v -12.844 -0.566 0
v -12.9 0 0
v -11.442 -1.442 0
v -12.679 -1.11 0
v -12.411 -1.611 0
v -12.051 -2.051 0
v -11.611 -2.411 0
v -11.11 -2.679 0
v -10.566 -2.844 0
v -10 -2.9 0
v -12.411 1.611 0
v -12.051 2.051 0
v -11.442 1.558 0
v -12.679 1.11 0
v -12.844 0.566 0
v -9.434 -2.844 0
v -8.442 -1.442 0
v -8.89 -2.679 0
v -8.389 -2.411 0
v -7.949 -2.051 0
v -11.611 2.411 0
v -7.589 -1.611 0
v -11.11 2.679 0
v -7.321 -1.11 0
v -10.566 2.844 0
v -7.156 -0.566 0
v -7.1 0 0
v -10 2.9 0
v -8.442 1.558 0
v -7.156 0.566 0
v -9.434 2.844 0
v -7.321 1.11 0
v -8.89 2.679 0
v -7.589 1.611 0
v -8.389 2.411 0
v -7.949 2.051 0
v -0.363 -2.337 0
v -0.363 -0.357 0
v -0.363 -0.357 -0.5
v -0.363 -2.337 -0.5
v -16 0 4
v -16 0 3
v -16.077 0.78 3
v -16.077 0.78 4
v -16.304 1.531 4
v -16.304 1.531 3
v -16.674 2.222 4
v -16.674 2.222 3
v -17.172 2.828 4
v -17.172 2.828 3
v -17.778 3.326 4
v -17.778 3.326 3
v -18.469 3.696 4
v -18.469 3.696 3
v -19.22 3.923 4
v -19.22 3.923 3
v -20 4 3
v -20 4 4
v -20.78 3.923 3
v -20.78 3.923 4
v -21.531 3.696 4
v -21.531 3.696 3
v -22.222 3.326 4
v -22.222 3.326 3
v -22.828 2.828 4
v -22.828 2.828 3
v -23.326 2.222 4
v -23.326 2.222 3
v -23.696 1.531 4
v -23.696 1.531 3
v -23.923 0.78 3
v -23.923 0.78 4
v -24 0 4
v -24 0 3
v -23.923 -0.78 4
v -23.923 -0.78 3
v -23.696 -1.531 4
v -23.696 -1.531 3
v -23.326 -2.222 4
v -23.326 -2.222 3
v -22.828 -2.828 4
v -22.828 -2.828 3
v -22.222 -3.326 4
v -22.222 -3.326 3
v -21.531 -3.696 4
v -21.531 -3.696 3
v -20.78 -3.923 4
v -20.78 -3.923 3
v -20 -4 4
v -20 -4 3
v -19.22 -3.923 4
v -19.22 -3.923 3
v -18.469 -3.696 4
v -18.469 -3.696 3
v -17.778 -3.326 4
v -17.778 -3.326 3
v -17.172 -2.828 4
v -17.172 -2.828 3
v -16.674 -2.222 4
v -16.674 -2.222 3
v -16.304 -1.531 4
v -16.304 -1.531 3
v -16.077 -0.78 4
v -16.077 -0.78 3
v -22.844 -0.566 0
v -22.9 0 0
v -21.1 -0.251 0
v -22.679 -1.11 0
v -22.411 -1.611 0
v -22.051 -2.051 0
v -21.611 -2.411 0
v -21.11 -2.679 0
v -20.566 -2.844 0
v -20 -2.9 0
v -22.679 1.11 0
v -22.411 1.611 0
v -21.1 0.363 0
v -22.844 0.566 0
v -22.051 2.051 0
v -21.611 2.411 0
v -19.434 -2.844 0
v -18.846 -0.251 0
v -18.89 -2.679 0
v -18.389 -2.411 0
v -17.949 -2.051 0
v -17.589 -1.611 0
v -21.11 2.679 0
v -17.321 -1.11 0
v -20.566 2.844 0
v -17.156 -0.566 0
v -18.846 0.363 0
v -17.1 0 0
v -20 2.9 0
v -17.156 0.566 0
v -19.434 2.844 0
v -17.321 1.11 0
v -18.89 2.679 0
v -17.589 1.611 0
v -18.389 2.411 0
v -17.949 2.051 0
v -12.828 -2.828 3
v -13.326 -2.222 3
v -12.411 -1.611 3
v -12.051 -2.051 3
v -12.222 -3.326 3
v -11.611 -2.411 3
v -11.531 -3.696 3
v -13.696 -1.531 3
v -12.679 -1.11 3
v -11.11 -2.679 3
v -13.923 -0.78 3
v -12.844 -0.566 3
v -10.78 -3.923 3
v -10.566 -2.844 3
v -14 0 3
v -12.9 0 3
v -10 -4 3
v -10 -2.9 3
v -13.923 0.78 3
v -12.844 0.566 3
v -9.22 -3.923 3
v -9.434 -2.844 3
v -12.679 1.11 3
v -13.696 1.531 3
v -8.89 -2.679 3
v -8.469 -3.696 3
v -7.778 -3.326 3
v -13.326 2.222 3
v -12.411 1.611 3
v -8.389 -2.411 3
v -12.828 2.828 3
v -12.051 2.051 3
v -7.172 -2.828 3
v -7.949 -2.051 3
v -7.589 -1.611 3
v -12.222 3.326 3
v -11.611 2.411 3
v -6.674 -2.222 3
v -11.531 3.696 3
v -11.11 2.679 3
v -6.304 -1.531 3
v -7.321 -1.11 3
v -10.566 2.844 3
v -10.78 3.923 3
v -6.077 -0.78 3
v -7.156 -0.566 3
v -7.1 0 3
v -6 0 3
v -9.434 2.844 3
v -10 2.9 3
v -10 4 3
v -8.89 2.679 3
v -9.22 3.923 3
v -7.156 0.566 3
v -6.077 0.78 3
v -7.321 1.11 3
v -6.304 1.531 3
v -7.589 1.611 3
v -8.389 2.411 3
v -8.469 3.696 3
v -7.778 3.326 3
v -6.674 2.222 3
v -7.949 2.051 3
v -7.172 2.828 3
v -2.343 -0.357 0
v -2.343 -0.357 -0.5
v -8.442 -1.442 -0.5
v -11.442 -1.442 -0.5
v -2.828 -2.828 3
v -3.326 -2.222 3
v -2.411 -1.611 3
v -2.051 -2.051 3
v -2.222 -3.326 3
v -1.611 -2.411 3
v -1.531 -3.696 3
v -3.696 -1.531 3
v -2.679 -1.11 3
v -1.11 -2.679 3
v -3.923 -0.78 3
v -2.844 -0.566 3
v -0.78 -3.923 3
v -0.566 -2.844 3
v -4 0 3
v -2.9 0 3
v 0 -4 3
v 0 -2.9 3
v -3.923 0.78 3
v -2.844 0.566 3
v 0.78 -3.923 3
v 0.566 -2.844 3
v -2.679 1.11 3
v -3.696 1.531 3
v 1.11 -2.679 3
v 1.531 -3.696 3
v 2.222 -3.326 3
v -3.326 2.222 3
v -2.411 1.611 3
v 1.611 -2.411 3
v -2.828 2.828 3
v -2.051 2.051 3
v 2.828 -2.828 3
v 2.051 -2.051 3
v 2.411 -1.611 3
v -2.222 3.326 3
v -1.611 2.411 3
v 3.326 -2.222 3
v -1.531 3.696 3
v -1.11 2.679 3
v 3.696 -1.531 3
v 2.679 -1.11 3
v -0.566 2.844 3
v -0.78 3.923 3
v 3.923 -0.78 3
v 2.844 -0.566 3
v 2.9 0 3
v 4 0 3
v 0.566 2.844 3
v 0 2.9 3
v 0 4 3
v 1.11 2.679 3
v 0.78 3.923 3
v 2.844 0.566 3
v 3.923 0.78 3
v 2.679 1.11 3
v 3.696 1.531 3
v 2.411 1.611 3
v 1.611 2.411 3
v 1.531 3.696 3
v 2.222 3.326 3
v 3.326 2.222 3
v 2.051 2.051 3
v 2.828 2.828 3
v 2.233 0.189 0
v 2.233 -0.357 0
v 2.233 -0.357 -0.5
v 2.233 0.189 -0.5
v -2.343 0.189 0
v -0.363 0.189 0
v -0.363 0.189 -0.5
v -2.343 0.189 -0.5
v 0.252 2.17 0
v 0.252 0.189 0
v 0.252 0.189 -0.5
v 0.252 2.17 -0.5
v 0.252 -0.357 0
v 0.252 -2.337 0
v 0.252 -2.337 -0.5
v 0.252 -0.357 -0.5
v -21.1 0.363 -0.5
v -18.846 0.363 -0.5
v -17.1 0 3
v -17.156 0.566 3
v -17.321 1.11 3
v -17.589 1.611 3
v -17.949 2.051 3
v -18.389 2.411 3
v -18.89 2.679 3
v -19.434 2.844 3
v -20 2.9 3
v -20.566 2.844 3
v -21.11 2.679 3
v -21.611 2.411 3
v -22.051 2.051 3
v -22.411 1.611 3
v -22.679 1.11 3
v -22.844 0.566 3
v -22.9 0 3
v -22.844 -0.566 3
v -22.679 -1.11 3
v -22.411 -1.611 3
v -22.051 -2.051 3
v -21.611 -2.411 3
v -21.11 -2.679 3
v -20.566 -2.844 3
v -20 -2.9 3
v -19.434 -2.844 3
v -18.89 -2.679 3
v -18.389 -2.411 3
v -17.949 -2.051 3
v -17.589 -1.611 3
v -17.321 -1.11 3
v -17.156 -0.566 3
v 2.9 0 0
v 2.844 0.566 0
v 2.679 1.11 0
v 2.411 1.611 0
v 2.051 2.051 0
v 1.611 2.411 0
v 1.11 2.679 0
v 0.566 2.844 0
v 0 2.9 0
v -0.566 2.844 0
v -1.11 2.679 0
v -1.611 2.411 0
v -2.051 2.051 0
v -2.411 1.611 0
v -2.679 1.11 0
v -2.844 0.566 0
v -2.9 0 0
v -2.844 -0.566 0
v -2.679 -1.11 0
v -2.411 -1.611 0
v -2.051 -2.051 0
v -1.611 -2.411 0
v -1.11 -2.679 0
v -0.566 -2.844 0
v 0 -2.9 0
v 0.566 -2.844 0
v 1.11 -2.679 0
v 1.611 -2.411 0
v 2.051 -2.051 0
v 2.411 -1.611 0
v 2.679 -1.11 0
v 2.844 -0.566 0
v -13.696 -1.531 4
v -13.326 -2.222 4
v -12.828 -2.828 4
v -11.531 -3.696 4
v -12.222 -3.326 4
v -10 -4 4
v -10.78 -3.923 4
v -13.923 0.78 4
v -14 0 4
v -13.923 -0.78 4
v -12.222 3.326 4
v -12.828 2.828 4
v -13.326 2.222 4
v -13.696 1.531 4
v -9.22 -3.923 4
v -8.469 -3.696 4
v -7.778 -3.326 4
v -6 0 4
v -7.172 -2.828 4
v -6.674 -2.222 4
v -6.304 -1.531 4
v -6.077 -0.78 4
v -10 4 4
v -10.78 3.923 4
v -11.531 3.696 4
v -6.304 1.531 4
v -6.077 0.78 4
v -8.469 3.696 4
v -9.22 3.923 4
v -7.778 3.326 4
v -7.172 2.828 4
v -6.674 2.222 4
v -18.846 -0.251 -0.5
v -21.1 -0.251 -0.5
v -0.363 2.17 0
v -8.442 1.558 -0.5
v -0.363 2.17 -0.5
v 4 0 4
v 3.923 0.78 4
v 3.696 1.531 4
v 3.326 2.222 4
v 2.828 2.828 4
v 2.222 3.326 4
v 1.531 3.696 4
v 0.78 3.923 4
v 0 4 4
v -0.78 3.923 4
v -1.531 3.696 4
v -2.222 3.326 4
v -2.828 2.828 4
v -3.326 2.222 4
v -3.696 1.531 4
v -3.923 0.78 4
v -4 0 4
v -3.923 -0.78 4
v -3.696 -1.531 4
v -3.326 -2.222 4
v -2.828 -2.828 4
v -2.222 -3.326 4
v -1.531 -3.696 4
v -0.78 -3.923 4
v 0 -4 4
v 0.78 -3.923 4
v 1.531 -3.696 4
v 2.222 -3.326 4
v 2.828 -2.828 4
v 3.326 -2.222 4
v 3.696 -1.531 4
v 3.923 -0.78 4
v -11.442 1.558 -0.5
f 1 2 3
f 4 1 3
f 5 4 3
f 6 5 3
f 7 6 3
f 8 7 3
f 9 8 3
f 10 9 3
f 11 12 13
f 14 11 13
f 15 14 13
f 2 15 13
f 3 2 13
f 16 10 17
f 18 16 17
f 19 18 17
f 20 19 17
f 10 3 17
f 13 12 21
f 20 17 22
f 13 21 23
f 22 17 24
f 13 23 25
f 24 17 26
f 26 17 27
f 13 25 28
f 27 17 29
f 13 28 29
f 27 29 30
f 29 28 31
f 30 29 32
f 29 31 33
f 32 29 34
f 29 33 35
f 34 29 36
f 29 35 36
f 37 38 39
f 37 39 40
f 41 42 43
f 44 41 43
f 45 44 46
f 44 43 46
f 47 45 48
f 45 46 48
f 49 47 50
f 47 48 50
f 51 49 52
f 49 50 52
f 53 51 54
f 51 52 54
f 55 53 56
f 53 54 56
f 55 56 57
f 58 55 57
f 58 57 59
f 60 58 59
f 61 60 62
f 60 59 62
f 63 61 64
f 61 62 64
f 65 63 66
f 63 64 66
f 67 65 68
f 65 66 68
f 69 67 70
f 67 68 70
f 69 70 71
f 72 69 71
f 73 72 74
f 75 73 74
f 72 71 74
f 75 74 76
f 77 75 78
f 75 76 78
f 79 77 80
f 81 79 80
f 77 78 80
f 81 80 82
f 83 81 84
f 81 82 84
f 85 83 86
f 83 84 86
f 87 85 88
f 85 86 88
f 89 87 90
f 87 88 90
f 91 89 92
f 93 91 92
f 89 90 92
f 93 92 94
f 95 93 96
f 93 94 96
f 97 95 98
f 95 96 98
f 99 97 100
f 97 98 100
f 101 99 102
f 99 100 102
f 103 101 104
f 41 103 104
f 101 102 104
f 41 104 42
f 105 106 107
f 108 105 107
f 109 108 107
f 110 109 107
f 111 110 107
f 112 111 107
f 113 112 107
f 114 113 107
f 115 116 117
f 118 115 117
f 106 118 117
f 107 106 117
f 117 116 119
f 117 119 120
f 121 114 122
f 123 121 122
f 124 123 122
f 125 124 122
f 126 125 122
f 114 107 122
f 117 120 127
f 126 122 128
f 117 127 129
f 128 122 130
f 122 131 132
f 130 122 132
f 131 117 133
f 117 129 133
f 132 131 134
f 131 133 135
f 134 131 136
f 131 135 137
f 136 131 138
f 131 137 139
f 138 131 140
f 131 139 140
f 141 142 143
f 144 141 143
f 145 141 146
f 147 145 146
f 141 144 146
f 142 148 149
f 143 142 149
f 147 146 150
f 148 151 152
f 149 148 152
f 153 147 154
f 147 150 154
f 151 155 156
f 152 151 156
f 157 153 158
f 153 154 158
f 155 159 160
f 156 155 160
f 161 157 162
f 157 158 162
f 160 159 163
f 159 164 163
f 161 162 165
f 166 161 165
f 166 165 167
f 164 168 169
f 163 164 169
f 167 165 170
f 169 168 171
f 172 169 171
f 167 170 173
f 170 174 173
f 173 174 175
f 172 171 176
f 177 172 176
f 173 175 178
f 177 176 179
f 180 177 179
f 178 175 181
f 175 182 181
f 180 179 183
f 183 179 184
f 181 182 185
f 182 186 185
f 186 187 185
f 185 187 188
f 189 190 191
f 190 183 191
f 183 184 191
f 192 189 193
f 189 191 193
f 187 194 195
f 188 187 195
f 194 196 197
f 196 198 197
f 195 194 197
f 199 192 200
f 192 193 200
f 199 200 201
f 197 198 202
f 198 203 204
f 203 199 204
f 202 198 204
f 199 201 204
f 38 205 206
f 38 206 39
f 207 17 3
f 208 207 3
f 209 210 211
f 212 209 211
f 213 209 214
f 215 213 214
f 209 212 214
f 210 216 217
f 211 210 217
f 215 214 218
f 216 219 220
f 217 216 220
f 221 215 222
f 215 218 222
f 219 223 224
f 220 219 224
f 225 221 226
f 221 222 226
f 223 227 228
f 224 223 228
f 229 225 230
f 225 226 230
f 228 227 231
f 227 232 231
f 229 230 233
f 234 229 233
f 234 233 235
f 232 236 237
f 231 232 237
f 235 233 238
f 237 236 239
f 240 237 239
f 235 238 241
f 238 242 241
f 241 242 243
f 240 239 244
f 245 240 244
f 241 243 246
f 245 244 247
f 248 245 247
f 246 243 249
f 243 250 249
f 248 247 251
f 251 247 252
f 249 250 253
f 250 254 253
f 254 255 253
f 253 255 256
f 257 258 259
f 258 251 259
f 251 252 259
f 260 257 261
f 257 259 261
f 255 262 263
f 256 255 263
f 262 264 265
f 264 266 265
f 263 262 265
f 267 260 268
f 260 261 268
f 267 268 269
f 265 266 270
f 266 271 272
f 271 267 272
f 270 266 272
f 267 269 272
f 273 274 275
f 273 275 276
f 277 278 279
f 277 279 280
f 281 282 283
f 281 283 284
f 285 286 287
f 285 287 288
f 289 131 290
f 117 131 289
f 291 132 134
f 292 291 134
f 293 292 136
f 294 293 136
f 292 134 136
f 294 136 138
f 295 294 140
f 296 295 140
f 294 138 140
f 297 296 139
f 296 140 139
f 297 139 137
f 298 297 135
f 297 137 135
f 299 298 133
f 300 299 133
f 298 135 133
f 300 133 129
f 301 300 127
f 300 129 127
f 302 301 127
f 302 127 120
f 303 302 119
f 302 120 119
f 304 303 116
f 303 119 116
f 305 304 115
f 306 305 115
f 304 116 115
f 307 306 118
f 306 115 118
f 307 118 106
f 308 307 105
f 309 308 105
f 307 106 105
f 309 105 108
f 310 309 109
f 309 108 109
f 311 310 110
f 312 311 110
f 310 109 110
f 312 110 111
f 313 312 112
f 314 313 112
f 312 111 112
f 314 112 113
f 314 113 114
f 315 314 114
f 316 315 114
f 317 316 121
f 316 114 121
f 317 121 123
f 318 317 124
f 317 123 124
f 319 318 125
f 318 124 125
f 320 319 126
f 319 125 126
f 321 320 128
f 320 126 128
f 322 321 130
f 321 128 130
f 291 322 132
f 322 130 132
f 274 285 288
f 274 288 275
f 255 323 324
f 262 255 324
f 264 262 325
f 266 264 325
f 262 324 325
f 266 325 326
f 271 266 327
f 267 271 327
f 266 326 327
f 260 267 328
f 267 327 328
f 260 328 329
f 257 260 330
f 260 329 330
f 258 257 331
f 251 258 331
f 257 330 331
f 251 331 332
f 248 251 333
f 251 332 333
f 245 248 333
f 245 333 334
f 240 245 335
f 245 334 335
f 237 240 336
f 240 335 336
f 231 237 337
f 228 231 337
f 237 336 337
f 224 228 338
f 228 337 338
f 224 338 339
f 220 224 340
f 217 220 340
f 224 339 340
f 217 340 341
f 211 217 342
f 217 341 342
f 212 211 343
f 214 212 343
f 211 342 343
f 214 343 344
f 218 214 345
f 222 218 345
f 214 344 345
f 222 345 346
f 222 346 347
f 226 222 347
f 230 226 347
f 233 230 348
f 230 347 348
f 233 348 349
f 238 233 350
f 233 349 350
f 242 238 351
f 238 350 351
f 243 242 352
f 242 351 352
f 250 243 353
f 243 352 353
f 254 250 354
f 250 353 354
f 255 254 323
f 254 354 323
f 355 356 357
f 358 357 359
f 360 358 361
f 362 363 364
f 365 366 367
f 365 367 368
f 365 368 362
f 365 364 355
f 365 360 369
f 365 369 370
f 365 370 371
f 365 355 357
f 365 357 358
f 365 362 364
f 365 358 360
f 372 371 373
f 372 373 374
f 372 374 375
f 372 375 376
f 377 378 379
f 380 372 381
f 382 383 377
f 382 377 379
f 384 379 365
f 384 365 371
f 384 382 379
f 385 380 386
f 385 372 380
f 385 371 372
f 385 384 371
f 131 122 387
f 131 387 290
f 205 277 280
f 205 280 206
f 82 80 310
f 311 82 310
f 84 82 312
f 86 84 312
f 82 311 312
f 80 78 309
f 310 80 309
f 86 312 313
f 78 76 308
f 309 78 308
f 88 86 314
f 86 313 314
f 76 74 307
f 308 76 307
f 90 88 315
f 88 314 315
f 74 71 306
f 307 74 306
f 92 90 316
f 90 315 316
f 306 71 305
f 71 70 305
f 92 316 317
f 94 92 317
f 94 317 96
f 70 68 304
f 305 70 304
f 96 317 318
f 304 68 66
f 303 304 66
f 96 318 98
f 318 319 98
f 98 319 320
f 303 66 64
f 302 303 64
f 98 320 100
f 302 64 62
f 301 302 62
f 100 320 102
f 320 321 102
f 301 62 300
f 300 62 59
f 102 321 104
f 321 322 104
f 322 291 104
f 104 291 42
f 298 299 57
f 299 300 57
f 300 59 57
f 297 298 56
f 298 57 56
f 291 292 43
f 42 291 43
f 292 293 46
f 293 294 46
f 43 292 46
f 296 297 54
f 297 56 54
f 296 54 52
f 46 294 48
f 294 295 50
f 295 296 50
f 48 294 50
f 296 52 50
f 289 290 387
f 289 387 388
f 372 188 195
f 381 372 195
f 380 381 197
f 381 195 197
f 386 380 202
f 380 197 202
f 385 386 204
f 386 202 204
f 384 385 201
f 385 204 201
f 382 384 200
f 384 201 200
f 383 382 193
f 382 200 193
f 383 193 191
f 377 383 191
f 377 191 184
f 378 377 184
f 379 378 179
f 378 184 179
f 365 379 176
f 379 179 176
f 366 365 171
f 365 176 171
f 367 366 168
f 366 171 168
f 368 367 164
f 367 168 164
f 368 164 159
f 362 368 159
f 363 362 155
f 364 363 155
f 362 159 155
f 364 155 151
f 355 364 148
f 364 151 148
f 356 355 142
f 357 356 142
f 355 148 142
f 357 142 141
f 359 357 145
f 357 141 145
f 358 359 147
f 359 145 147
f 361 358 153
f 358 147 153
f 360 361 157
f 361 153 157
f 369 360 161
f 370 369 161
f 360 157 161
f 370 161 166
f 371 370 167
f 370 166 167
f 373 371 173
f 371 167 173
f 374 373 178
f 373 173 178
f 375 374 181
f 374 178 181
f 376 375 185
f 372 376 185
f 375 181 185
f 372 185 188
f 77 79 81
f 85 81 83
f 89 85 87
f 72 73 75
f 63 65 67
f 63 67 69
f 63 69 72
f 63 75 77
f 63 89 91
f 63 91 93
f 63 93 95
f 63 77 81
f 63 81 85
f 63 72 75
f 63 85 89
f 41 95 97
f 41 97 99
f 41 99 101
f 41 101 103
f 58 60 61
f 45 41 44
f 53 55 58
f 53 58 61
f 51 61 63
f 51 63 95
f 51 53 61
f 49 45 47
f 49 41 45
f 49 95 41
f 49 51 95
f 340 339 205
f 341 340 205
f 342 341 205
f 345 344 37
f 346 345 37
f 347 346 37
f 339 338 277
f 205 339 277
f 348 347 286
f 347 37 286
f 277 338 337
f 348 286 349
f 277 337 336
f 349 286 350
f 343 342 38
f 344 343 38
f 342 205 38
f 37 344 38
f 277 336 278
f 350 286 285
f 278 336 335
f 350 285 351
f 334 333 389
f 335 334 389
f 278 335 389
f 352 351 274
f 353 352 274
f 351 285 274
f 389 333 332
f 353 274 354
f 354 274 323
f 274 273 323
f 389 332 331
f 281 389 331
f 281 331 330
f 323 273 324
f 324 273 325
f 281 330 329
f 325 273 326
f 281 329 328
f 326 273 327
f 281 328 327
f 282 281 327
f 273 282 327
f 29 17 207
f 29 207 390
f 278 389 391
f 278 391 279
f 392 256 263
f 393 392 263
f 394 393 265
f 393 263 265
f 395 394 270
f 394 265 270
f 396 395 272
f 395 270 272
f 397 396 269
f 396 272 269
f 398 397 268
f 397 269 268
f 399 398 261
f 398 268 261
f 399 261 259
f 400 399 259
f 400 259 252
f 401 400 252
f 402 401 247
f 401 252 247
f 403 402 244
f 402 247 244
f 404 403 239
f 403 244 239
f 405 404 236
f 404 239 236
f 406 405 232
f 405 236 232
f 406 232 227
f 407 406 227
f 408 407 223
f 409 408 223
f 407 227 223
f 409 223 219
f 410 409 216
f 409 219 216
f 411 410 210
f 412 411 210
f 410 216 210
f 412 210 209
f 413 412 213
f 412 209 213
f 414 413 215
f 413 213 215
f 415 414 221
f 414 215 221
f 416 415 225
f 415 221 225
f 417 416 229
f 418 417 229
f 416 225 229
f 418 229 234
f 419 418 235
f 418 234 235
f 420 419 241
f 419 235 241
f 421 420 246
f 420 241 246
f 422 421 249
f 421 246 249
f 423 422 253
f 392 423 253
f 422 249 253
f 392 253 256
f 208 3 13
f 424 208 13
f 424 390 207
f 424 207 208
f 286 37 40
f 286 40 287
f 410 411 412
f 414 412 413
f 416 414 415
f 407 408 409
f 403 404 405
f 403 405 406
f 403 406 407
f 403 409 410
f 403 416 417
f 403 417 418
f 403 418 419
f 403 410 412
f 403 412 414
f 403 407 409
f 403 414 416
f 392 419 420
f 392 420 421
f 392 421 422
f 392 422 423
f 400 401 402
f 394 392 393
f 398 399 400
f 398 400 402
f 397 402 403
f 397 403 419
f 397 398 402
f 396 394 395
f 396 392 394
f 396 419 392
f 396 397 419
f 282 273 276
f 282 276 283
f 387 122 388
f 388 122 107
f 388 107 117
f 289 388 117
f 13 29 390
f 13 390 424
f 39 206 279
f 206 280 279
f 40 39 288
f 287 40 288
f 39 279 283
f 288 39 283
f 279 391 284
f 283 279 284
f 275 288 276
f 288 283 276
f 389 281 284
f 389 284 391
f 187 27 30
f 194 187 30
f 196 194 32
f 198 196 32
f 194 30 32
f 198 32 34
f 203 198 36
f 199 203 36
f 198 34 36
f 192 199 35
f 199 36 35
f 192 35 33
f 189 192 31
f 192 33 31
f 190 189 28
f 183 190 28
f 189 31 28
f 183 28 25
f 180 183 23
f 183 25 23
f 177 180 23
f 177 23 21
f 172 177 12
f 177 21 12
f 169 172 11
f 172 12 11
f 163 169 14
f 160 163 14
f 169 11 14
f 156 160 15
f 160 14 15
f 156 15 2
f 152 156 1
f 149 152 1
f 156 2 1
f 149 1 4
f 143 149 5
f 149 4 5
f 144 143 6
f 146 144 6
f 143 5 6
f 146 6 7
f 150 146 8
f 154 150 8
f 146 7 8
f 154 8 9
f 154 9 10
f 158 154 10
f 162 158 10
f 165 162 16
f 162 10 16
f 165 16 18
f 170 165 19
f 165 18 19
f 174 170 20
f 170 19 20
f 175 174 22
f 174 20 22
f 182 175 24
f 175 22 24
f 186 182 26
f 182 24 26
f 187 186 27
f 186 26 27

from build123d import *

# Parameters (mm, degrees)
ESQUISSE1_R                = 2.9
BOSS_EXTRU_1_DEPTH         = 3
ESQUISSE2_R                = 4
BOSS_EXTRU_2_DEPTH         = 1
R_P_TITION_LIN_AIRE2_COUNT = 3
R_P_TITION_LIN_AIRE2_PITCH = 10
ESQUISSE4_W                = 3
ESQUISSE4_H                = 3
ESQUISSE4_W_2              = 2.253615753
ESQUISSE4_H_2              = 0.614622478
BOSS_EXTRU_3_DEPTH         = 0.5


with BuildPart() as part:
    # Esquisse1 → Boss.-Extru.1 (new body)
    with BuildSketch(Plane.XY):
        Circle(ESQUISSE1_R)
    extrude(amount=BOSS_EXTRU_1_DEPTH)

    # Esquisse2 → Boss.-Extru.2 (add)
    with BuildSketch(Plane.XY.offset(3)):
        Circle(ESQUISSE2_R)
    extrude(amount=BOSS_EXTRU_2_DEPTH)


with BuildPart() as r_p_tition_lin_aire2_1:
    # Répétition linéaire2: pattern copy
    add(part.part.moved(Location(Vector(-1, 0, 0) * (1 * R_P_TITION_LIN_AIRE2_PITCH))))


with BuildPart() as r_p_tition_lin_aire2_2:
    # Répétition linéaire2: pattern copy
    add(part.part.moved(Location(Vector(-1, 0, 0) * (2 * R_P_TITION_LIN_AIRE2_PITCH))))


with BuildPart() as part_1:
    add(part.part)

    add(r_p_tition_lin_aire2_1.part)  # Boss.-Extru.3 merges Répétition linéaire2_1

    add(r_p_tition_lin_aire2_2.part)  # Boss.-Extru.3 merges Répétition linéaire2_2
    # Esquisse4 → Boss.-Extru.3 (add)
    with BuildSketch(Plane(origin=(0, 0, 0), x_dir=(-1, 0, 0), z_dir=(0, 0, -1))):
        with Locations((9.942046118, 0.058344616)):
            Rectangle(ESQUISSE4_W, ESQUISSE4_H)
        Polygon((2.342989472, -0.357020155), (0.362539264, -0.357020155), (0.362539264, -2.337470363), (-0.252083214, -2.337470363), (-0.252083214, -0.357020155), (-2.232533422, -0.357020155), (-2.232533422, 0.189310936), (-0.252083214, 0.189310936), (-0.252083214, 2.169761144), (0.362539264, 2.169761144), (0.362539264, 0.189310936), (2.342989472, 0.189310936), align=None)
        with Locations((19.973138969, 0.056052833)):
            Rectangle(ESQUISSE4_W_2, ESQUISSE4_H_2)
    extrude(amount=BOSS_EXTRU_3_DEPTH)


solid = part_1.part
